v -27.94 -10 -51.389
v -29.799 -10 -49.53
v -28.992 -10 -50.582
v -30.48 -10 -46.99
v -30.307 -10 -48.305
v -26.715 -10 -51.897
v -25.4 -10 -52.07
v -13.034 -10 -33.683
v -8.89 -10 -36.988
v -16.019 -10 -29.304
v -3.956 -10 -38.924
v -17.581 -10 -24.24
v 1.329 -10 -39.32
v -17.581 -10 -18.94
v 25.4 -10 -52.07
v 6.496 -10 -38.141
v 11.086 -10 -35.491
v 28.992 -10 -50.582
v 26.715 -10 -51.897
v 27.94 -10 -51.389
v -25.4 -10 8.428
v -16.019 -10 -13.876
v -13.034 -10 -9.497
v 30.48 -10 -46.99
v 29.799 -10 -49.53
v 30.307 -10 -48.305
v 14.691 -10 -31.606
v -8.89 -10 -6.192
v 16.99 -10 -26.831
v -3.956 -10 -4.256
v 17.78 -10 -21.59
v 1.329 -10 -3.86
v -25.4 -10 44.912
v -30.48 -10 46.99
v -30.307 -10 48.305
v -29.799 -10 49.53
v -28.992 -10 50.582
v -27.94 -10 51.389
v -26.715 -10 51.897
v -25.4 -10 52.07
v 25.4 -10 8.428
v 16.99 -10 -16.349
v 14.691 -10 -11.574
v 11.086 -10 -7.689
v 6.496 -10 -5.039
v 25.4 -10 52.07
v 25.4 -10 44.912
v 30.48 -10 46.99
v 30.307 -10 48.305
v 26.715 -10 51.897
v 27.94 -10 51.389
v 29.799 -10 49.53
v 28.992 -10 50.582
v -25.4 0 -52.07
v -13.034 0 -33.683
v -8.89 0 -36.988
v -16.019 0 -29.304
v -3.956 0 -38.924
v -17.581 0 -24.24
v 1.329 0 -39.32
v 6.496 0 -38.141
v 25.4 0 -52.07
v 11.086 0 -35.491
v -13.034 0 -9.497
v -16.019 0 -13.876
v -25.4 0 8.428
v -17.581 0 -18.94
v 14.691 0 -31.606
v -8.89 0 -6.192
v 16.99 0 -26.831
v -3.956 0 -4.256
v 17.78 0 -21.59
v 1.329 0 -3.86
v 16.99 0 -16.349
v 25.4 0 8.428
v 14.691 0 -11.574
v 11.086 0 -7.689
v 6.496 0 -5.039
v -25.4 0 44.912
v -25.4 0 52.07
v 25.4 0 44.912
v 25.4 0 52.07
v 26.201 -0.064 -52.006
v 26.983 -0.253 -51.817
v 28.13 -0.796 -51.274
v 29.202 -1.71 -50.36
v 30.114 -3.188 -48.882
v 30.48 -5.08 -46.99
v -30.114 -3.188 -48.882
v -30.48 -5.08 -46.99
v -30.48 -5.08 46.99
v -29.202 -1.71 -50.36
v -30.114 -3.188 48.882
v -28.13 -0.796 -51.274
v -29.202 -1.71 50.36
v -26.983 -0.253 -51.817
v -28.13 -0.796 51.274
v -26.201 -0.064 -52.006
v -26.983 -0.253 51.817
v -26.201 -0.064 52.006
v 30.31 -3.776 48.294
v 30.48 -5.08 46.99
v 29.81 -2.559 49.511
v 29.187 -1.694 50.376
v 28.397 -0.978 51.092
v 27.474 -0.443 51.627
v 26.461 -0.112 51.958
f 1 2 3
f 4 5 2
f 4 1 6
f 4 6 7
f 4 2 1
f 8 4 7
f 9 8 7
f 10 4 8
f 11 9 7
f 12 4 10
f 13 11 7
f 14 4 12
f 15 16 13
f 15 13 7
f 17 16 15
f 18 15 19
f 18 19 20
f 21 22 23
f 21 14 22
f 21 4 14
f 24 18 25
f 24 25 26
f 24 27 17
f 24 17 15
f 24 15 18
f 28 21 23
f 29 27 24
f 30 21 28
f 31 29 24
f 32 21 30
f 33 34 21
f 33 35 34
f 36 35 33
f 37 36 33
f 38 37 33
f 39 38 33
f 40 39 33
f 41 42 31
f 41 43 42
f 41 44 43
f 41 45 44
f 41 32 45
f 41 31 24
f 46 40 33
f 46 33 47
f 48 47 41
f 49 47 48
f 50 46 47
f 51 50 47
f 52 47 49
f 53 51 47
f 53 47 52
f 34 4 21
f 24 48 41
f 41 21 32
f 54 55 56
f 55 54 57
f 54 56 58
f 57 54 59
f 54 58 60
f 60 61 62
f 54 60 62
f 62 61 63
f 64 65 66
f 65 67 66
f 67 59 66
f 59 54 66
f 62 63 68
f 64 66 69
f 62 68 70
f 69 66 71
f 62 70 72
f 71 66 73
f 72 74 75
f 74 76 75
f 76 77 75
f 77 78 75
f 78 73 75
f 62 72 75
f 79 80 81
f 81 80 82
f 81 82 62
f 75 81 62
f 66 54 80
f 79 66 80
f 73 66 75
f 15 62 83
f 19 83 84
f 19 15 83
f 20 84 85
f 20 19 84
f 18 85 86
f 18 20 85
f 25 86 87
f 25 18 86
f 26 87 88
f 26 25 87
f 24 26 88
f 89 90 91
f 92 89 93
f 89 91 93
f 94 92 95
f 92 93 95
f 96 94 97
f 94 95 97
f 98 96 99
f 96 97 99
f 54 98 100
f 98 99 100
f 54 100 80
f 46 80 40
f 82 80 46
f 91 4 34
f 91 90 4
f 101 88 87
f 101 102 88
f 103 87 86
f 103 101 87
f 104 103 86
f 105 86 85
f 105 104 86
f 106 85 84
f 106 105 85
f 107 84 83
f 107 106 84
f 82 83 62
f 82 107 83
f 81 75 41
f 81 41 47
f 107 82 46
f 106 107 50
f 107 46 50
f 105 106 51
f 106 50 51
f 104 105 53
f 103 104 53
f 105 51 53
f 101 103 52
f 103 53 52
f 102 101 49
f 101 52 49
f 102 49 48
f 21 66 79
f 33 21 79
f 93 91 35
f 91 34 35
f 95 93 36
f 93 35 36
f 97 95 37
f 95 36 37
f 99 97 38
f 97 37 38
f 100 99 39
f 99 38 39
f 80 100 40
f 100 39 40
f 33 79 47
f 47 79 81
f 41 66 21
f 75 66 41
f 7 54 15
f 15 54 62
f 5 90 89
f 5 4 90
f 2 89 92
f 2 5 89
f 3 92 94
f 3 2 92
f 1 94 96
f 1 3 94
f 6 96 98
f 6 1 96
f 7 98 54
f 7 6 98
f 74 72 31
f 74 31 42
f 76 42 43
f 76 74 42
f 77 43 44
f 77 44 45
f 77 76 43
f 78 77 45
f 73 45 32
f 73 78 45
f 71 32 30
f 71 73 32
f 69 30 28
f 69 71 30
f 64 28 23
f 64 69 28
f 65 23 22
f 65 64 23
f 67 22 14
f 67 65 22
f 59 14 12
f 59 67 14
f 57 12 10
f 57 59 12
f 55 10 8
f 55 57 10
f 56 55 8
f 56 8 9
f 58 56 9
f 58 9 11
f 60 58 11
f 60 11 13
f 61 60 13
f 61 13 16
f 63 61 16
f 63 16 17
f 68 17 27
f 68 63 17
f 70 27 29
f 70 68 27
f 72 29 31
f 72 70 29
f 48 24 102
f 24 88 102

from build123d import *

# Parameters (mm, degrees)
F0_W     = 60.96
F0_H     = 104.14
F0_R     = 17.78
F0_W_2   = 50.8
F0_H_2   = 36.4836389199
F1_DEPTH = 10
F2_R     = 5.07999


# Not quite as in the source:
# - a fillet or chamfer is up to 0.001 mm smaller than in the source, because OpenCascade refuses the exact size


with BuildPart() as f1:
    # F0 (on Front) → F1 (new body)
    with BuildSketch(Plane.XZ):
        Rectangle(F0_W, F0_H)
        with Locations((0, -21.59)):
            Circle(F0_R, mode=Mode.SUBTRACT)
        with Locations((0, 26.67)):
            Rectangle(F0_W_2, F0_H_2, mode=Mode.SUBTRACT)
    extrude(amount=F1_DEPTH)

    # F2 (radius 5.08 in the source; OpenCascade refuses exactly that, so slightly less here)
    f2_edges = [f1.edges().sort_by_distance(p)[0] for p in [
        (-30.48, -5, 52.07),
        (-30.48, -5, -52.07),
        (30.48, -5, 52.07),
        (-30.48, 0, 0),
        (30.48, 0, 0),
        (30.48, -5, -52.07),
    ]]
    fillet(f2_edges, radius=F2_R)


solid = f1.part
